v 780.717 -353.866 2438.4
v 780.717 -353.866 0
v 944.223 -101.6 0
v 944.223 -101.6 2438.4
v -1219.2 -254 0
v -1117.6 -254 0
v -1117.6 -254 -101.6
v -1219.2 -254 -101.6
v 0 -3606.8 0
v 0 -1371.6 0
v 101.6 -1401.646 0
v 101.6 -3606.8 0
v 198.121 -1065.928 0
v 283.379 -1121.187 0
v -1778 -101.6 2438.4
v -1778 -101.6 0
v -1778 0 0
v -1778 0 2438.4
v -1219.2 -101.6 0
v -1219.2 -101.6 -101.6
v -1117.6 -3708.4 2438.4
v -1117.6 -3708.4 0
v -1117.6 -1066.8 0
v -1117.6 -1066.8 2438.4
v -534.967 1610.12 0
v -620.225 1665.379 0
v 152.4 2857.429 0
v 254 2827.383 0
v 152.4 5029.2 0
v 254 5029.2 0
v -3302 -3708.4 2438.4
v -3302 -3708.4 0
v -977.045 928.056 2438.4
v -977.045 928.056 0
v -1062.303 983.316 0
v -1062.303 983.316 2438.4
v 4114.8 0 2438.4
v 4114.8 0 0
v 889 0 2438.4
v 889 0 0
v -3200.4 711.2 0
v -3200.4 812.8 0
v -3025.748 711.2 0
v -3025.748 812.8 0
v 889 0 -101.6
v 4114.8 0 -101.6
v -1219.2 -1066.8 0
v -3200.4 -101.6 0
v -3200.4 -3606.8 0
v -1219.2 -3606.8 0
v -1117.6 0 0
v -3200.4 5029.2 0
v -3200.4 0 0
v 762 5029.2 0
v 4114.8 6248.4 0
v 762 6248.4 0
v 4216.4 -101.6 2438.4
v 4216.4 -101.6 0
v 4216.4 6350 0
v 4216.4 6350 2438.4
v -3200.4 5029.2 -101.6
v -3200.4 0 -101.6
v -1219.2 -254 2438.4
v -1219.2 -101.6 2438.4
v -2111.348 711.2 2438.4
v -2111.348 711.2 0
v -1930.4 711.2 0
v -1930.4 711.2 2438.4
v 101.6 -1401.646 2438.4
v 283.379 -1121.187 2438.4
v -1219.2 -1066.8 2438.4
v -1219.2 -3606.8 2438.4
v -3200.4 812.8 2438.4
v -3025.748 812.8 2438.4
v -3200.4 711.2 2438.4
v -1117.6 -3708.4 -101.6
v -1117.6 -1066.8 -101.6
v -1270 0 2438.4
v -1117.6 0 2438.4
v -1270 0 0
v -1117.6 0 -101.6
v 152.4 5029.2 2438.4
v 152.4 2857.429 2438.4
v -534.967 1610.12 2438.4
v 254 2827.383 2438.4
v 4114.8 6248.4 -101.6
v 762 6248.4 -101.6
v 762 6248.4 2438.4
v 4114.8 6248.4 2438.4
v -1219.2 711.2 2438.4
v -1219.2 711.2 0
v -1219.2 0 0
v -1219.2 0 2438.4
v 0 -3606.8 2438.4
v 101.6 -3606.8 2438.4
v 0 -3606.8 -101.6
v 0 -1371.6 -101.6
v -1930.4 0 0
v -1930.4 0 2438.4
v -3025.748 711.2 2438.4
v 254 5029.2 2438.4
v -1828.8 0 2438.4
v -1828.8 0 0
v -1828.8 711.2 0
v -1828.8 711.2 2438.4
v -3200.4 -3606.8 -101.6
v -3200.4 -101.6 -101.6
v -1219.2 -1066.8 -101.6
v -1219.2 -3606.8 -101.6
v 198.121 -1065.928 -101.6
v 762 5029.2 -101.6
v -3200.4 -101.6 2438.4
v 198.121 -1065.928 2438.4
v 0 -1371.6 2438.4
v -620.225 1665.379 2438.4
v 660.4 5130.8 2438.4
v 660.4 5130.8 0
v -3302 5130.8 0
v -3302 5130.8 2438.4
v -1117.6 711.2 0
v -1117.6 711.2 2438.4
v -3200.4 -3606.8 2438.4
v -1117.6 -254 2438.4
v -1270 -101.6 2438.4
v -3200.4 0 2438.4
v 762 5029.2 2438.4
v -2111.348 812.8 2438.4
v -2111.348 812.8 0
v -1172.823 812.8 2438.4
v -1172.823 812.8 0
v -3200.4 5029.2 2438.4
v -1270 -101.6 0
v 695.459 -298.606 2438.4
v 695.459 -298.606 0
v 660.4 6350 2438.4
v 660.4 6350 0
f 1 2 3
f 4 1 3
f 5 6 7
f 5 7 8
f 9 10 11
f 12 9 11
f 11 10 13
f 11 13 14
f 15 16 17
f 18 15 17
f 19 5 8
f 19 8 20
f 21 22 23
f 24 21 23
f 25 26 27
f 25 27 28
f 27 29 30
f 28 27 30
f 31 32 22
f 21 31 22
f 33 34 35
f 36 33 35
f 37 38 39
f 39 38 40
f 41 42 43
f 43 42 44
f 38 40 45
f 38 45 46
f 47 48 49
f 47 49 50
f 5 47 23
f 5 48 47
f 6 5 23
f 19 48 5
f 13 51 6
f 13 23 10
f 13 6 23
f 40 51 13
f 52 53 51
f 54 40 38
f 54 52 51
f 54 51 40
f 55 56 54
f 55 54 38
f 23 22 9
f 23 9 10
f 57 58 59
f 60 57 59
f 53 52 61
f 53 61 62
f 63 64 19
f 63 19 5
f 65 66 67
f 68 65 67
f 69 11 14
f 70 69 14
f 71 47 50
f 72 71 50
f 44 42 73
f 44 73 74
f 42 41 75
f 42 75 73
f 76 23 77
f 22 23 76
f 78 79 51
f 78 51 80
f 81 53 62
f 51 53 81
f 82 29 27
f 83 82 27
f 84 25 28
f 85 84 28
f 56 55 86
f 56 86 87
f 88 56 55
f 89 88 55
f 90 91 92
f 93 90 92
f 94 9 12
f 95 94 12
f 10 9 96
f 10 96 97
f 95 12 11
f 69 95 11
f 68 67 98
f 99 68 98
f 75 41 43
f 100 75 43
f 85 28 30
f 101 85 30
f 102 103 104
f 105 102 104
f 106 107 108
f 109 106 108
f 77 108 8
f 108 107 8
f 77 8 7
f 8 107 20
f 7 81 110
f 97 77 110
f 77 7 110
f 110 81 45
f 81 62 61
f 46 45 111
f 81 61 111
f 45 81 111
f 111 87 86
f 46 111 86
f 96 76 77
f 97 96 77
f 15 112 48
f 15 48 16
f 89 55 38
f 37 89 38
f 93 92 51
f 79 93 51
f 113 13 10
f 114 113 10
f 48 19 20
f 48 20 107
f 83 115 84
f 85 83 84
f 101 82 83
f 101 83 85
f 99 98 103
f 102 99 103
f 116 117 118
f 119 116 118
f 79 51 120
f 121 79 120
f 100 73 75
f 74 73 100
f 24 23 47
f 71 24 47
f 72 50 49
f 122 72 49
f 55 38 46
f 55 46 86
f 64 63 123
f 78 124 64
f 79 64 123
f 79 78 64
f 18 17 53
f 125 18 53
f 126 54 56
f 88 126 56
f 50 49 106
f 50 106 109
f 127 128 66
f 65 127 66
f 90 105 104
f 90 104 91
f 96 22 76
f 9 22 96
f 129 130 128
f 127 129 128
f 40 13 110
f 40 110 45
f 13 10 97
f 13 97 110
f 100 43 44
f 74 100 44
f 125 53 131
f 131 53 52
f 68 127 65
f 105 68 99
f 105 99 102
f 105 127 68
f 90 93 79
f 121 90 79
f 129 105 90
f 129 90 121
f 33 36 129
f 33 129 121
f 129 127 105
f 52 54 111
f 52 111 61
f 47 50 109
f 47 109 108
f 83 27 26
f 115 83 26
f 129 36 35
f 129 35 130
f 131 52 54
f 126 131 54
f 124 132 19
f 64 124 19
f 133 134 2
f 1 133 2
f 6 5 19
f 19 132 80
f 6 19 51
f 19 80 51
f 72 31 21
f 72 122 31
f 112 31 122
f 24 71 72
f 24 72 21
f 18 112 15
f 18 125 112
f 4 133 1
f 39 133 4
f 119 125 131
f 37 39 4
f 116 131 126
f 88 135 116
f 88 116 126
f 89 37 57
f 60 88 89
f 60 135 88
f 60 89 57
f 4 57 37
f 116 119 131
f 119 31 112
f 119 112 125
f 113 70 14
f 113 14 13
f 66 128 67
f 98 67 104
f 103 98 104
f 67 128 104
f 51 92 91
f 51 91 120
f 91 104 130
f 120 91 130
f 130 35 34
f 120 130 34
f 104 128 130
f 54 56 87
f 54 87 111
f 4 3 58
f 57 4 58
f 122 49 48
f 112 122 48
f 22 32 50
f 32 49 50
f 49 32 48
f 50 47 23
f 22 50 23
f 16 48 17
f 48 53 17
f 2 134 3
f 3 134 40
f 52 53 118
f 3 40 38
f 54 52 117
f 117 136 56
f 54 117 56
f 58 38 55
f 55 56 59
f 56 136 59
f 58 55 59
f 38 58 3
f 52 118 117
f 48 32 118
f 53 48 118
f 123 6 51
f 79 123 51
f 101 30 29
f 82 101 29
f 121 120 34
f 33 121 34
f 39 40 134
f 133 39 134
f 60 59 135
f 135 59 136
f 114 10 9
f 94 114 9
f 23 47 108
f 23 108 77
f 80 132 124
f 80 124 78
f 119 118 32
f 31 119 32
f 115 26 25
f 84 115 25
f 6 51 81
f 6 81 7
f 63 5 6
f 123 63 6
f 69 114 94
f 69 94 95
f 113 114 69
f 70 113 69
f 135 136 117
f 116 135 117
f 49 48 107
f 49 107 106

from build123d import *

# Parameters (mm, degrees)
F1_DEPTH = 2438.4
F3_DEPTH = 101.6
F4_W     = 174.651609
F4_H     = 101.6
F5_DEPTH = 2438.4
F6_W     = 508
F6_H     = 388.720166
F7_DEPTH = 2438.4


with BuildPart() as f1:
    # F0 (on Top) → F1 (new body)
    with BuildSketch(Plane.XY):
        Polygon((-1219.2, -1066.8), (-1219.2, -1524), (-1219.2, -3606.8), (-3200.4, -3606.8), (-3200.4, -101.6), (-1219.2, -101.6), (-1219.2, -254), (-1117.6, -254), (-1117.6, 0), (-3200.4, 0), (-3200.4, 5029.2), (762, 5029.2), (762, 6248.4), (4114.8, 6248.4), (4114.8, 0), (889, 0), (695.459022, -298.606081), (780.716965, -353.865859), (944.222614, -101.6), (4216.4, -101.6), (4216.4, 6350), (660.4, 6350), (660.4, 5130.8), (-3302, 5130.8), (-3302, -3708.4), (-1648.964067, -3708.4), (-1117.6, -3708.4), (-1117.6, -3606.8), (-1117.6, -1524), (-1117.6, -1066.8), align=None)
        Polygon((198.121018, -1065.927572), (0, -1371.6), (0, -3606.8), (101.6, -3606.8), (101.6, -1401.646319), (283.378962, -1121.18735), align=None)
    extrude(amount=F1_DEPTH)


with BuildPart() as f3:
    # F2 (on Top) → F3 (new body)
    with BuildSketch(Plane.XY):
        Polygon((762, 5029.2), (-3200.4, 5029.2), (-3200.4, 0), (-1117.6, 0), (-1117.6, -254), (-1219.2, -254), (-1219.2, -101.6), (-3200.4, -101.6), (-3200.4, -3606.8), (-1219.2, -3606.8), (-1219.2, -1066.8), (-1117.6, -1066.8), (-1117.6, -3708.4), (0, -3606.8), (0, -1371.6), (198.121018, -1065.927572), (889, 0), (4114.8, 0), (4114.8, 6248.4), (762, 6248.4), align=None)
    extrude(amount=-F3_DEPTH)


with BuildPart() as f5:
    # F4 (on Top) → F5 (new body)
    with BuildSketch(Plane.XY):
        Polygon((254, 5029.2), (152.4, 5029.2), (152.4, 2857.429177), (-620.224833, 1665.379434), (-534.96689, 1610.119656), (254, 2827.382857), align=None)
        Polygon((-1062.303058, 983.315887), (-1172.822614, 812.8), (-2111.348391, 812.8), (-2111.348391, 711.2), (-1930.4, 711.2), (-1930.4, 0), (-1828.8, 0), (-1828.8, 711.2), (-1219.2, 711.2), (-1219.2, 0), (-1117.6, 0), (-1117.6, 711.2), (-977.045115, 928.056109), align=None)
        with Locations((-3113.074195, 762)):
            Rectangle(F4_W, F4_H)
    extrude(amount=F5_DEPTH)


with BuildPart() as f7:
    # F6 (on Top) → F7 (new body, through all)
    with BuildSketch(Plane.XY):
        with Locations((-1524, -32.291073)):
            Rectangle(F6_W, F6_H)
    extrude(amount=F7_DEPTH)


with BuildPart() as f1_1:
    add(f1.part)

    # F8: cut F7
    add(f7.part, mode=Mode.SUBTRACT)


solid = Compound([f3.part, f5.part, f1_1.part])
